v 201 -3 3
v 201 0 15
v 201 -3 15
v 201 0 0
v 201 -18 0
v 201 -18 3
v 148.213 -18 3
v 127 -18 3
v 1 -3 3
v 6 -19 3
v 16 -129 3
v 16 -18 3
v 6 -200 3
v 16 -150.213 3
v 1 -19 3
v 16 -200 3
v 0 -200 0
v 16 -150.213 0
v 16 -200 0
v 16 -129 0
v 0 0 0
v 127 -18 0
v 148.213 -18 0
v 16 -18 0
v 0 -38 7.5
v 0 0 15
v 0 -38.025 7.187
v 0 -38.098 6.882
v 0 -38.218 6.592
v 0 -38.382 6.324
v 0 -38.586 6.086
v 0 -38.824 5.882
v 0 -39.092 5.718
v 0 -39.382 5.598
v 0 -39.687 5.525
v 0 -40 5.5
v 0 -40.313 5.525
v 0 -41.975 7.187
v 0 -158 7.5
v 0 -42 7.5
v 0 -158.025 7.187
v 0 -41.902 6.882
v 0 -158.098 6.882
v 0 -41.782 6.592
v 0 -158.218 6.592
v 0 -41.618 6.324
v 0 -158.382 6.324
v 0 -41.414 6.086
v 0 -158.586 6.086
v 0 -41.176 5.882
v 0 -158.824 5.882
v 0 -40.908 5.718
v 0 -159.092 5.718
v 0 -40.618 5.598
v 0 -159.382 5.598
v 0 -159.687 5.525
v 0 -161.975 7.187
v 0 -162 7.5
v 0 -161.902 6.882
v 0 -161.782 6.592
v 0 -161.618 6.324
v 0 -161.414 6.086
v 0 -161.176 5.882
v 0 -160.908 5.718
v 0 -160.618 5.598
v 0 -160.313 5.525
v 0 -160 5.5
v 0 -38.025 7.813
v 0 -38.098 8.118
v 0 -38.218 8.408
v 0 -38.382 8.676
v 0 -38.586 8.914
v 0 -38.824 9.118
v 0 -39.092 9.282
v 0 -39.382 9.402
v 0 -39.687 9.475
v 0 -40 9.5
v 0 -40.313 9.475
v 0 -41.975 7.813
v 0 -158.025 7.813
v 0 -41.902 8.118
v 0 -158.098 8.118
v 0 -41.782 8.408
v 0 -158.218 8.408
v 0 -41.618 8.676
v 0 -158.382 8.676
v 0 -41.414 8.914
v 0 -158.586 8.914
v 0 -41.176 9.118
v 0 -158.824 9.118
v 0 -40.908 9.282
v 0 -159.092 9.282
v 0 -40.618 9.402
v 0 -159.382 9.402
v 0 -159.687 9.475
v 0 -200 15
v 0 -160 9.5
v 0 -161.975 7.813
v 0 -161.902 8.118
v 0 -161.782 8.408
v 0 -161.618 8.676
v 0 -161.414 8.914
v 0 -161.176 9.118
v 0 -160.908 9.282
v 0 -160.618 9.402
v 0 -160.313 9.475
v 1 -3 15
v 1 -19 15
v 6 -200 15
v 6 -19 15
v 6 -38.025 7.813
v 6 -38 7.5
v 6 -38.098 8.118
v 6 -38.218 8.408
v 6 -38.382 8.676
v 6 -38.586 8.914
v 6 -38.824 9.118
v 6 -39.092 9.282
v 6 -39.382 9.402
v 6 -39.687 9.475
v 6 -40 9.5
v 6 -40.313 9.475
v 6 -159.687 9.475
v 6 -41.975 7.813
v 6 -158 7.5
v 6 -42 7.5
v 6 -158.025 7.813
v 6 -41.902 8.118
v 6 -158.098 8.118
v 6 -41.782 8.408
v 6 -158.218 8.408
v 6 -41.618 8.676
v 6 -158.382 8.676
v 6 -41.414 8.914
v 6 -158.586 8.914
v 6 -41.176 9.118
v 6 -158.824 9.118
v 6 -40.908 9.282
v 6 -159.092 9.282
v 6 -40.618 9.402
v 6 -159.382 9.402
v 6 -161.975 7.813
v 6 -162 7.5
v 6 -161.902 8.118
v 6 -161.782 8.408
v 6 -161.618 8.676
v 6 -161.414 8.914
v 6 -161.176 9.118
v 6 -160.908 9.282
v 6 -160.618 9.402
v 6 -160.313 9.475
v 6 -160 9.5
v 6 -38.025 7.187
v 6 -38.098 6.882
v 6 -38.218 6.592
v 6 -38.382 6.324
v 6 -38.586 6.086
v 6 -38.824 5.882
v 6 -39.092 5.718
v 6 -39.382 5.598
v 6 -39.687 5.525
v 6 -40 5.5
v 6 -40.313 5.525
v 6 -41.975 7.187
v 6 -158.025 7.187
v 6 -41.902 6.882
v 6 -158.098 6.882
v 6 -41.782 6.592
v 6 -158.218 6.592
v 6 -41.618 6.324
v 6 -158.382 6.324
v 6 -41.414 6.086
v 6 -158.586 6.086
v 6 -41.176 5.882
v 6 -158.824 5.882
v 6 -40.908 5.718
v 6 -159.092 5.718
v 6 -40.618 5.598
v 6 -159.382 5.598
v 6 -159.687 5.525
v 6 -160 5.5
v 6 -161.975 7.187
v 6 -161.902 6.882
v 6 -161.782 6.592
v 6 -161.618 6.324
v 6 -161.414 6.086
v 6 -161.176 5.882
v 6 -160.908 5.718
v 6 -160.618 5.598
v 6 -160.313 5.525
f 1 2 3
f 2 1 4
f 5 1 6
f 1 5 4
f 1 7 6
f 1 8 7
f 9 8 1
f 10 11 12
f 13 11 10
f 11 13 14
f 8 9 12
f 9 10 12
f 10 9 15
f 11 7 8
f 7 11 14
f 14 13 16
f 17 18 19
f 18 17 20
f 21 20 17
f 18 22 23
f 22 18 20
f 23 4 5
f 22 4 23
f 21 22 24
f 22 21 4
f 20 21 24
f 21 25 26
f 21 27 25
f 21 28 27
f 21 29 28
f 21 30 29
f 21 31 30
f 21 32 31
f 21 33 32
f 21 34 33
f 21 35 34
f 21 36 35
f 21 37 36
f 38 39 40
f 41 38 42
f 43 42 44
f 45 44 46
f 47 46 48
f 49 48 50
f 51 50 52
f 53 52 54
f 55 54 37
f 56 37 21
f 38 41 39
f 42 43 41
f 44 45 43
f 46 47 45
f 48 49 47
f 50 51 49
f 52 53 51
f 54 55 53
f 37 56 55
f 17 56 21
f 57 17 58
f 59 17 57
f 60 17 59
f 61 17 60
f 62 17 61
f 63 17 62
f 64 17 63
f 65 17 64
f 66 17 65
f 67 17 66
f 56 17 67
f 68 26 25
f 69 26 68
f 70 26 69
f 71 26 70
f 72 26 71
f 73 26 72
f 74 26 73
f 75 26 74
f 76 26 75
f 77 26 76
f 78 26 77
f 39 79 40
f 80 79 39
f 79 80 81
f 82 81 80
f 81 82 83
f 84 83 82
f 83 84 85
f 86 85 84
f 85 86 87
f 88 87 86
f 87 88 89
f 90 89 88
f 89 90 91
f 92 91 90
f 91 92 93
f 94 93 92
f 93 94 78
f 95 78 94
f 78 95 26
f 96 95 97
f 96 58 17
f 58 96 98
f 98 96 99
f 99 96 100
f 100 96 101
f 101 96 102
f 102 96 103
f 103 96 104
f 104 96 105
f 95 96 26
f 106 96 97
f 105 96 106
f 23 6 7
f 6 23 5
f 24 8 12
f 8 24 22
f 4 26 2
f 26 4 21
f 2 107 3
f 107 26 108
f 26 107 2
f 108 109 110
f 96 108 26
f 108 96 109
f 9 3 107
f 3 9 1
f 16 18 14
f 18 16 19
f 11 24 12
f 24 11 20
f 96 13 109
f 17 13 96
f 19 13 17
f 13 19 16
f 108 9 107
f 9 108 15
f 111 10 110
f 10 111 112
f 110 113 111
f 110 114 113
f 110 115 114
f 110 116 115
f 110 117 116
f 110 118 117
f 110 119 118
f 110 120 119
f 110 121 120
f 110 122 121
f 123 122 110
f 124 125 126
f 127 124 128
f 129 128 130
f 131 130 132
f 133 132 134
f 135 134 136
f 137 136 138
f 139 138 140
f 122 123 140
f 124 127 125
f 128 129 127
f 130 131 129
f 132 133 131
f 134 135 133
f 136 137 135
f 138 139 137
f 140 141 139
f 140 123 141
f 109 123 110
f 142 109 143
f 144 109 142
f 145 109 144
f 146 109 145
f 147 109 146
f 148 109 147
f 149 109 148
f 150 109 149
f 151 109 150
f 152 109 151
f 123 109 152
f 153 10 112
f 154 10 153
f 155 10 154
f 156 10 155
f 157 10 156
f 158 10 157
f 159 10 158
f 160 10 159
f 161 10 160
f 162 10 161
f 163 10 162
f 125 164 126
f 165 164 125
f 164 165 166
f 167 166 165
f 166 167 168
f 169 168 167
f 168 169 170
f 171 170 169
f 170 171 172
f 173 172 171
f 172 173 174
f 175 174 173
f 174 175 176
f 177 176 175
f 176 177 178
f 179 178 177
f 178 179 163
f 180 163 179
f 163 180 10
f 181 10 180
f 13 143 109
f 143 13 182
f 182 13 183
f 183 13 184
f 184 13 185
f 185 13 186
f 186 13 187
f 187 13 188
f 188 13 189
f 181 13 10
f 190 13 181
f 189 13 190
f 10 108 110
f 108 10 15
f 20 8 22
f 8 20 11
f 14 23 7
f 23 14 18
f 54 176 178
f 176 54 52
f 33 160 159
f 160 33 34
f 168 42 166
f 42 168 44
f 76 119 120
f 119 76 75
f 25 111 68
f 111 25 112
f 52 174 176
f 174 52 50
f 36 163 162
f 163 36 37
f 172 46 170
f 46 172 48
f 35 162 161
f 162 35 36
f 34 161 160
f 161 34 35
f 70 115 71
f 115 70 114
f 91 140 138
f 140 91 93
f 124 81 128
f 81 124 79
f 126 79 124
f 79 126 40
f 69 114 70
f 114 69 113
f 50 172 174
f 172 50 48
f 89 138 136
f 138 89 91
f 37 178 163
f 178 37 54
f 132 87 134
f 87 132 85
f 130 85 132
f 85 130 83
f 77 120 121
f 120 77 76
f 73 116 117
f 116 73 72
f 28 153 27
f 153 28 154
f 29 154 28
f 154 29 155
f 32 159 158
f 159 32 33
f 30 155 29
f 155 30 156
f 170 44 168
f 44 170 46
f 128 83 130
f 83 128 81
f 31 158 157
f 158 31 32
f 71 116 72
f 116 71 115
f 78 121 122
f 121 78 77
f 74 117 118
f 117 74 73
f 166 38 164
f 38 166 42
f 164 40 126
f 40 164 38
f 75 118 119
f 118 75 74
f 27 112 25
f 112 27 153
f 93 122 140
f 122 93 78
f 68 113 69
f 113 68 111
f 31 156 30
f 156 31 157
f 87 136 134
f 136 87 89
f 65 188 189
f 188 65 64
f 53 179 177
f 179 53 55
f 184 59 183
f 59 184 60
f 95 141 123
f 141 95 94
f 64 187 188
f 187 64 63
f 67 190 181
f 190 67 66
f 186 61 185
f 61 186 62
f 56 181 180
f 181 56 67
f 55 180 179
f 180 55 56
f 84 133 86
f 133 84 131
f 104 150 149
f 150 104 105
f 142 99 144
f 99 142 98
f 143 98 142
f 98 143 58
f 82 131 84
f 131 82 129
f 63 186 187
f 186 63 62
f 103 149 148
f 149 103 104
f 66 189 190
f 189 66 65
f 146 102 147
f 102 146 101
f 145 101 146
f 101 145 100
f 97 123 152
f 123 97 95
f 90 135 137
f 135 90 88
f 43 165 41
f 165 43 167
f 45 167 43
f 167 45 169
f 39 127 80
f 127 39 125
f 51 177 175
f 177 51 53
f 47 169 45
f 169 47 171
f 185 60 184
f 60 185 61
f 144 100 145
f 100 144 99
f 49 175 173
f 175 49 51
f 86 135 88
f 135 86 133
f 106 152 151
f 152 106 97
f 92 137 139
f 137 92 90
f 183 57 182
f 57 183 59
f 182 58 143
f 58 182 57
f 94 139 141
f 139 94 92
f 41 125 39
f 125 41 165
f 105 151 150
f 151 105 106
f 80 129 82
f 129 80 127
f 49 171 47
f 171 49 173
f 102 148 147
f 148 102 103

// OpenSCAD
rotate([180, 0, 0])
mirror([0, 0, 1])
difference() {
  union() {
    cube([201, 18, 3]);
    cube([201, 3, 15]);
    cube([16, 200, 3]);
    cube([1, 200, 15]);
    translate([0, 19, 0])
      cube([6, 181, 15]);
    translate([145, 0, 0])
      rotate([0, 0, 45])
      cube([15, 200, 3]);
  }
  translate([-40, 40, 7.5])
    rotate([0, 90, 0])
    cylinder(100, d=4, $fn=40);
  translate([-40, 160, 7.5])
    rotate([0, 90, 0])
    cylinder(100, d=4, $fn=40);
}
